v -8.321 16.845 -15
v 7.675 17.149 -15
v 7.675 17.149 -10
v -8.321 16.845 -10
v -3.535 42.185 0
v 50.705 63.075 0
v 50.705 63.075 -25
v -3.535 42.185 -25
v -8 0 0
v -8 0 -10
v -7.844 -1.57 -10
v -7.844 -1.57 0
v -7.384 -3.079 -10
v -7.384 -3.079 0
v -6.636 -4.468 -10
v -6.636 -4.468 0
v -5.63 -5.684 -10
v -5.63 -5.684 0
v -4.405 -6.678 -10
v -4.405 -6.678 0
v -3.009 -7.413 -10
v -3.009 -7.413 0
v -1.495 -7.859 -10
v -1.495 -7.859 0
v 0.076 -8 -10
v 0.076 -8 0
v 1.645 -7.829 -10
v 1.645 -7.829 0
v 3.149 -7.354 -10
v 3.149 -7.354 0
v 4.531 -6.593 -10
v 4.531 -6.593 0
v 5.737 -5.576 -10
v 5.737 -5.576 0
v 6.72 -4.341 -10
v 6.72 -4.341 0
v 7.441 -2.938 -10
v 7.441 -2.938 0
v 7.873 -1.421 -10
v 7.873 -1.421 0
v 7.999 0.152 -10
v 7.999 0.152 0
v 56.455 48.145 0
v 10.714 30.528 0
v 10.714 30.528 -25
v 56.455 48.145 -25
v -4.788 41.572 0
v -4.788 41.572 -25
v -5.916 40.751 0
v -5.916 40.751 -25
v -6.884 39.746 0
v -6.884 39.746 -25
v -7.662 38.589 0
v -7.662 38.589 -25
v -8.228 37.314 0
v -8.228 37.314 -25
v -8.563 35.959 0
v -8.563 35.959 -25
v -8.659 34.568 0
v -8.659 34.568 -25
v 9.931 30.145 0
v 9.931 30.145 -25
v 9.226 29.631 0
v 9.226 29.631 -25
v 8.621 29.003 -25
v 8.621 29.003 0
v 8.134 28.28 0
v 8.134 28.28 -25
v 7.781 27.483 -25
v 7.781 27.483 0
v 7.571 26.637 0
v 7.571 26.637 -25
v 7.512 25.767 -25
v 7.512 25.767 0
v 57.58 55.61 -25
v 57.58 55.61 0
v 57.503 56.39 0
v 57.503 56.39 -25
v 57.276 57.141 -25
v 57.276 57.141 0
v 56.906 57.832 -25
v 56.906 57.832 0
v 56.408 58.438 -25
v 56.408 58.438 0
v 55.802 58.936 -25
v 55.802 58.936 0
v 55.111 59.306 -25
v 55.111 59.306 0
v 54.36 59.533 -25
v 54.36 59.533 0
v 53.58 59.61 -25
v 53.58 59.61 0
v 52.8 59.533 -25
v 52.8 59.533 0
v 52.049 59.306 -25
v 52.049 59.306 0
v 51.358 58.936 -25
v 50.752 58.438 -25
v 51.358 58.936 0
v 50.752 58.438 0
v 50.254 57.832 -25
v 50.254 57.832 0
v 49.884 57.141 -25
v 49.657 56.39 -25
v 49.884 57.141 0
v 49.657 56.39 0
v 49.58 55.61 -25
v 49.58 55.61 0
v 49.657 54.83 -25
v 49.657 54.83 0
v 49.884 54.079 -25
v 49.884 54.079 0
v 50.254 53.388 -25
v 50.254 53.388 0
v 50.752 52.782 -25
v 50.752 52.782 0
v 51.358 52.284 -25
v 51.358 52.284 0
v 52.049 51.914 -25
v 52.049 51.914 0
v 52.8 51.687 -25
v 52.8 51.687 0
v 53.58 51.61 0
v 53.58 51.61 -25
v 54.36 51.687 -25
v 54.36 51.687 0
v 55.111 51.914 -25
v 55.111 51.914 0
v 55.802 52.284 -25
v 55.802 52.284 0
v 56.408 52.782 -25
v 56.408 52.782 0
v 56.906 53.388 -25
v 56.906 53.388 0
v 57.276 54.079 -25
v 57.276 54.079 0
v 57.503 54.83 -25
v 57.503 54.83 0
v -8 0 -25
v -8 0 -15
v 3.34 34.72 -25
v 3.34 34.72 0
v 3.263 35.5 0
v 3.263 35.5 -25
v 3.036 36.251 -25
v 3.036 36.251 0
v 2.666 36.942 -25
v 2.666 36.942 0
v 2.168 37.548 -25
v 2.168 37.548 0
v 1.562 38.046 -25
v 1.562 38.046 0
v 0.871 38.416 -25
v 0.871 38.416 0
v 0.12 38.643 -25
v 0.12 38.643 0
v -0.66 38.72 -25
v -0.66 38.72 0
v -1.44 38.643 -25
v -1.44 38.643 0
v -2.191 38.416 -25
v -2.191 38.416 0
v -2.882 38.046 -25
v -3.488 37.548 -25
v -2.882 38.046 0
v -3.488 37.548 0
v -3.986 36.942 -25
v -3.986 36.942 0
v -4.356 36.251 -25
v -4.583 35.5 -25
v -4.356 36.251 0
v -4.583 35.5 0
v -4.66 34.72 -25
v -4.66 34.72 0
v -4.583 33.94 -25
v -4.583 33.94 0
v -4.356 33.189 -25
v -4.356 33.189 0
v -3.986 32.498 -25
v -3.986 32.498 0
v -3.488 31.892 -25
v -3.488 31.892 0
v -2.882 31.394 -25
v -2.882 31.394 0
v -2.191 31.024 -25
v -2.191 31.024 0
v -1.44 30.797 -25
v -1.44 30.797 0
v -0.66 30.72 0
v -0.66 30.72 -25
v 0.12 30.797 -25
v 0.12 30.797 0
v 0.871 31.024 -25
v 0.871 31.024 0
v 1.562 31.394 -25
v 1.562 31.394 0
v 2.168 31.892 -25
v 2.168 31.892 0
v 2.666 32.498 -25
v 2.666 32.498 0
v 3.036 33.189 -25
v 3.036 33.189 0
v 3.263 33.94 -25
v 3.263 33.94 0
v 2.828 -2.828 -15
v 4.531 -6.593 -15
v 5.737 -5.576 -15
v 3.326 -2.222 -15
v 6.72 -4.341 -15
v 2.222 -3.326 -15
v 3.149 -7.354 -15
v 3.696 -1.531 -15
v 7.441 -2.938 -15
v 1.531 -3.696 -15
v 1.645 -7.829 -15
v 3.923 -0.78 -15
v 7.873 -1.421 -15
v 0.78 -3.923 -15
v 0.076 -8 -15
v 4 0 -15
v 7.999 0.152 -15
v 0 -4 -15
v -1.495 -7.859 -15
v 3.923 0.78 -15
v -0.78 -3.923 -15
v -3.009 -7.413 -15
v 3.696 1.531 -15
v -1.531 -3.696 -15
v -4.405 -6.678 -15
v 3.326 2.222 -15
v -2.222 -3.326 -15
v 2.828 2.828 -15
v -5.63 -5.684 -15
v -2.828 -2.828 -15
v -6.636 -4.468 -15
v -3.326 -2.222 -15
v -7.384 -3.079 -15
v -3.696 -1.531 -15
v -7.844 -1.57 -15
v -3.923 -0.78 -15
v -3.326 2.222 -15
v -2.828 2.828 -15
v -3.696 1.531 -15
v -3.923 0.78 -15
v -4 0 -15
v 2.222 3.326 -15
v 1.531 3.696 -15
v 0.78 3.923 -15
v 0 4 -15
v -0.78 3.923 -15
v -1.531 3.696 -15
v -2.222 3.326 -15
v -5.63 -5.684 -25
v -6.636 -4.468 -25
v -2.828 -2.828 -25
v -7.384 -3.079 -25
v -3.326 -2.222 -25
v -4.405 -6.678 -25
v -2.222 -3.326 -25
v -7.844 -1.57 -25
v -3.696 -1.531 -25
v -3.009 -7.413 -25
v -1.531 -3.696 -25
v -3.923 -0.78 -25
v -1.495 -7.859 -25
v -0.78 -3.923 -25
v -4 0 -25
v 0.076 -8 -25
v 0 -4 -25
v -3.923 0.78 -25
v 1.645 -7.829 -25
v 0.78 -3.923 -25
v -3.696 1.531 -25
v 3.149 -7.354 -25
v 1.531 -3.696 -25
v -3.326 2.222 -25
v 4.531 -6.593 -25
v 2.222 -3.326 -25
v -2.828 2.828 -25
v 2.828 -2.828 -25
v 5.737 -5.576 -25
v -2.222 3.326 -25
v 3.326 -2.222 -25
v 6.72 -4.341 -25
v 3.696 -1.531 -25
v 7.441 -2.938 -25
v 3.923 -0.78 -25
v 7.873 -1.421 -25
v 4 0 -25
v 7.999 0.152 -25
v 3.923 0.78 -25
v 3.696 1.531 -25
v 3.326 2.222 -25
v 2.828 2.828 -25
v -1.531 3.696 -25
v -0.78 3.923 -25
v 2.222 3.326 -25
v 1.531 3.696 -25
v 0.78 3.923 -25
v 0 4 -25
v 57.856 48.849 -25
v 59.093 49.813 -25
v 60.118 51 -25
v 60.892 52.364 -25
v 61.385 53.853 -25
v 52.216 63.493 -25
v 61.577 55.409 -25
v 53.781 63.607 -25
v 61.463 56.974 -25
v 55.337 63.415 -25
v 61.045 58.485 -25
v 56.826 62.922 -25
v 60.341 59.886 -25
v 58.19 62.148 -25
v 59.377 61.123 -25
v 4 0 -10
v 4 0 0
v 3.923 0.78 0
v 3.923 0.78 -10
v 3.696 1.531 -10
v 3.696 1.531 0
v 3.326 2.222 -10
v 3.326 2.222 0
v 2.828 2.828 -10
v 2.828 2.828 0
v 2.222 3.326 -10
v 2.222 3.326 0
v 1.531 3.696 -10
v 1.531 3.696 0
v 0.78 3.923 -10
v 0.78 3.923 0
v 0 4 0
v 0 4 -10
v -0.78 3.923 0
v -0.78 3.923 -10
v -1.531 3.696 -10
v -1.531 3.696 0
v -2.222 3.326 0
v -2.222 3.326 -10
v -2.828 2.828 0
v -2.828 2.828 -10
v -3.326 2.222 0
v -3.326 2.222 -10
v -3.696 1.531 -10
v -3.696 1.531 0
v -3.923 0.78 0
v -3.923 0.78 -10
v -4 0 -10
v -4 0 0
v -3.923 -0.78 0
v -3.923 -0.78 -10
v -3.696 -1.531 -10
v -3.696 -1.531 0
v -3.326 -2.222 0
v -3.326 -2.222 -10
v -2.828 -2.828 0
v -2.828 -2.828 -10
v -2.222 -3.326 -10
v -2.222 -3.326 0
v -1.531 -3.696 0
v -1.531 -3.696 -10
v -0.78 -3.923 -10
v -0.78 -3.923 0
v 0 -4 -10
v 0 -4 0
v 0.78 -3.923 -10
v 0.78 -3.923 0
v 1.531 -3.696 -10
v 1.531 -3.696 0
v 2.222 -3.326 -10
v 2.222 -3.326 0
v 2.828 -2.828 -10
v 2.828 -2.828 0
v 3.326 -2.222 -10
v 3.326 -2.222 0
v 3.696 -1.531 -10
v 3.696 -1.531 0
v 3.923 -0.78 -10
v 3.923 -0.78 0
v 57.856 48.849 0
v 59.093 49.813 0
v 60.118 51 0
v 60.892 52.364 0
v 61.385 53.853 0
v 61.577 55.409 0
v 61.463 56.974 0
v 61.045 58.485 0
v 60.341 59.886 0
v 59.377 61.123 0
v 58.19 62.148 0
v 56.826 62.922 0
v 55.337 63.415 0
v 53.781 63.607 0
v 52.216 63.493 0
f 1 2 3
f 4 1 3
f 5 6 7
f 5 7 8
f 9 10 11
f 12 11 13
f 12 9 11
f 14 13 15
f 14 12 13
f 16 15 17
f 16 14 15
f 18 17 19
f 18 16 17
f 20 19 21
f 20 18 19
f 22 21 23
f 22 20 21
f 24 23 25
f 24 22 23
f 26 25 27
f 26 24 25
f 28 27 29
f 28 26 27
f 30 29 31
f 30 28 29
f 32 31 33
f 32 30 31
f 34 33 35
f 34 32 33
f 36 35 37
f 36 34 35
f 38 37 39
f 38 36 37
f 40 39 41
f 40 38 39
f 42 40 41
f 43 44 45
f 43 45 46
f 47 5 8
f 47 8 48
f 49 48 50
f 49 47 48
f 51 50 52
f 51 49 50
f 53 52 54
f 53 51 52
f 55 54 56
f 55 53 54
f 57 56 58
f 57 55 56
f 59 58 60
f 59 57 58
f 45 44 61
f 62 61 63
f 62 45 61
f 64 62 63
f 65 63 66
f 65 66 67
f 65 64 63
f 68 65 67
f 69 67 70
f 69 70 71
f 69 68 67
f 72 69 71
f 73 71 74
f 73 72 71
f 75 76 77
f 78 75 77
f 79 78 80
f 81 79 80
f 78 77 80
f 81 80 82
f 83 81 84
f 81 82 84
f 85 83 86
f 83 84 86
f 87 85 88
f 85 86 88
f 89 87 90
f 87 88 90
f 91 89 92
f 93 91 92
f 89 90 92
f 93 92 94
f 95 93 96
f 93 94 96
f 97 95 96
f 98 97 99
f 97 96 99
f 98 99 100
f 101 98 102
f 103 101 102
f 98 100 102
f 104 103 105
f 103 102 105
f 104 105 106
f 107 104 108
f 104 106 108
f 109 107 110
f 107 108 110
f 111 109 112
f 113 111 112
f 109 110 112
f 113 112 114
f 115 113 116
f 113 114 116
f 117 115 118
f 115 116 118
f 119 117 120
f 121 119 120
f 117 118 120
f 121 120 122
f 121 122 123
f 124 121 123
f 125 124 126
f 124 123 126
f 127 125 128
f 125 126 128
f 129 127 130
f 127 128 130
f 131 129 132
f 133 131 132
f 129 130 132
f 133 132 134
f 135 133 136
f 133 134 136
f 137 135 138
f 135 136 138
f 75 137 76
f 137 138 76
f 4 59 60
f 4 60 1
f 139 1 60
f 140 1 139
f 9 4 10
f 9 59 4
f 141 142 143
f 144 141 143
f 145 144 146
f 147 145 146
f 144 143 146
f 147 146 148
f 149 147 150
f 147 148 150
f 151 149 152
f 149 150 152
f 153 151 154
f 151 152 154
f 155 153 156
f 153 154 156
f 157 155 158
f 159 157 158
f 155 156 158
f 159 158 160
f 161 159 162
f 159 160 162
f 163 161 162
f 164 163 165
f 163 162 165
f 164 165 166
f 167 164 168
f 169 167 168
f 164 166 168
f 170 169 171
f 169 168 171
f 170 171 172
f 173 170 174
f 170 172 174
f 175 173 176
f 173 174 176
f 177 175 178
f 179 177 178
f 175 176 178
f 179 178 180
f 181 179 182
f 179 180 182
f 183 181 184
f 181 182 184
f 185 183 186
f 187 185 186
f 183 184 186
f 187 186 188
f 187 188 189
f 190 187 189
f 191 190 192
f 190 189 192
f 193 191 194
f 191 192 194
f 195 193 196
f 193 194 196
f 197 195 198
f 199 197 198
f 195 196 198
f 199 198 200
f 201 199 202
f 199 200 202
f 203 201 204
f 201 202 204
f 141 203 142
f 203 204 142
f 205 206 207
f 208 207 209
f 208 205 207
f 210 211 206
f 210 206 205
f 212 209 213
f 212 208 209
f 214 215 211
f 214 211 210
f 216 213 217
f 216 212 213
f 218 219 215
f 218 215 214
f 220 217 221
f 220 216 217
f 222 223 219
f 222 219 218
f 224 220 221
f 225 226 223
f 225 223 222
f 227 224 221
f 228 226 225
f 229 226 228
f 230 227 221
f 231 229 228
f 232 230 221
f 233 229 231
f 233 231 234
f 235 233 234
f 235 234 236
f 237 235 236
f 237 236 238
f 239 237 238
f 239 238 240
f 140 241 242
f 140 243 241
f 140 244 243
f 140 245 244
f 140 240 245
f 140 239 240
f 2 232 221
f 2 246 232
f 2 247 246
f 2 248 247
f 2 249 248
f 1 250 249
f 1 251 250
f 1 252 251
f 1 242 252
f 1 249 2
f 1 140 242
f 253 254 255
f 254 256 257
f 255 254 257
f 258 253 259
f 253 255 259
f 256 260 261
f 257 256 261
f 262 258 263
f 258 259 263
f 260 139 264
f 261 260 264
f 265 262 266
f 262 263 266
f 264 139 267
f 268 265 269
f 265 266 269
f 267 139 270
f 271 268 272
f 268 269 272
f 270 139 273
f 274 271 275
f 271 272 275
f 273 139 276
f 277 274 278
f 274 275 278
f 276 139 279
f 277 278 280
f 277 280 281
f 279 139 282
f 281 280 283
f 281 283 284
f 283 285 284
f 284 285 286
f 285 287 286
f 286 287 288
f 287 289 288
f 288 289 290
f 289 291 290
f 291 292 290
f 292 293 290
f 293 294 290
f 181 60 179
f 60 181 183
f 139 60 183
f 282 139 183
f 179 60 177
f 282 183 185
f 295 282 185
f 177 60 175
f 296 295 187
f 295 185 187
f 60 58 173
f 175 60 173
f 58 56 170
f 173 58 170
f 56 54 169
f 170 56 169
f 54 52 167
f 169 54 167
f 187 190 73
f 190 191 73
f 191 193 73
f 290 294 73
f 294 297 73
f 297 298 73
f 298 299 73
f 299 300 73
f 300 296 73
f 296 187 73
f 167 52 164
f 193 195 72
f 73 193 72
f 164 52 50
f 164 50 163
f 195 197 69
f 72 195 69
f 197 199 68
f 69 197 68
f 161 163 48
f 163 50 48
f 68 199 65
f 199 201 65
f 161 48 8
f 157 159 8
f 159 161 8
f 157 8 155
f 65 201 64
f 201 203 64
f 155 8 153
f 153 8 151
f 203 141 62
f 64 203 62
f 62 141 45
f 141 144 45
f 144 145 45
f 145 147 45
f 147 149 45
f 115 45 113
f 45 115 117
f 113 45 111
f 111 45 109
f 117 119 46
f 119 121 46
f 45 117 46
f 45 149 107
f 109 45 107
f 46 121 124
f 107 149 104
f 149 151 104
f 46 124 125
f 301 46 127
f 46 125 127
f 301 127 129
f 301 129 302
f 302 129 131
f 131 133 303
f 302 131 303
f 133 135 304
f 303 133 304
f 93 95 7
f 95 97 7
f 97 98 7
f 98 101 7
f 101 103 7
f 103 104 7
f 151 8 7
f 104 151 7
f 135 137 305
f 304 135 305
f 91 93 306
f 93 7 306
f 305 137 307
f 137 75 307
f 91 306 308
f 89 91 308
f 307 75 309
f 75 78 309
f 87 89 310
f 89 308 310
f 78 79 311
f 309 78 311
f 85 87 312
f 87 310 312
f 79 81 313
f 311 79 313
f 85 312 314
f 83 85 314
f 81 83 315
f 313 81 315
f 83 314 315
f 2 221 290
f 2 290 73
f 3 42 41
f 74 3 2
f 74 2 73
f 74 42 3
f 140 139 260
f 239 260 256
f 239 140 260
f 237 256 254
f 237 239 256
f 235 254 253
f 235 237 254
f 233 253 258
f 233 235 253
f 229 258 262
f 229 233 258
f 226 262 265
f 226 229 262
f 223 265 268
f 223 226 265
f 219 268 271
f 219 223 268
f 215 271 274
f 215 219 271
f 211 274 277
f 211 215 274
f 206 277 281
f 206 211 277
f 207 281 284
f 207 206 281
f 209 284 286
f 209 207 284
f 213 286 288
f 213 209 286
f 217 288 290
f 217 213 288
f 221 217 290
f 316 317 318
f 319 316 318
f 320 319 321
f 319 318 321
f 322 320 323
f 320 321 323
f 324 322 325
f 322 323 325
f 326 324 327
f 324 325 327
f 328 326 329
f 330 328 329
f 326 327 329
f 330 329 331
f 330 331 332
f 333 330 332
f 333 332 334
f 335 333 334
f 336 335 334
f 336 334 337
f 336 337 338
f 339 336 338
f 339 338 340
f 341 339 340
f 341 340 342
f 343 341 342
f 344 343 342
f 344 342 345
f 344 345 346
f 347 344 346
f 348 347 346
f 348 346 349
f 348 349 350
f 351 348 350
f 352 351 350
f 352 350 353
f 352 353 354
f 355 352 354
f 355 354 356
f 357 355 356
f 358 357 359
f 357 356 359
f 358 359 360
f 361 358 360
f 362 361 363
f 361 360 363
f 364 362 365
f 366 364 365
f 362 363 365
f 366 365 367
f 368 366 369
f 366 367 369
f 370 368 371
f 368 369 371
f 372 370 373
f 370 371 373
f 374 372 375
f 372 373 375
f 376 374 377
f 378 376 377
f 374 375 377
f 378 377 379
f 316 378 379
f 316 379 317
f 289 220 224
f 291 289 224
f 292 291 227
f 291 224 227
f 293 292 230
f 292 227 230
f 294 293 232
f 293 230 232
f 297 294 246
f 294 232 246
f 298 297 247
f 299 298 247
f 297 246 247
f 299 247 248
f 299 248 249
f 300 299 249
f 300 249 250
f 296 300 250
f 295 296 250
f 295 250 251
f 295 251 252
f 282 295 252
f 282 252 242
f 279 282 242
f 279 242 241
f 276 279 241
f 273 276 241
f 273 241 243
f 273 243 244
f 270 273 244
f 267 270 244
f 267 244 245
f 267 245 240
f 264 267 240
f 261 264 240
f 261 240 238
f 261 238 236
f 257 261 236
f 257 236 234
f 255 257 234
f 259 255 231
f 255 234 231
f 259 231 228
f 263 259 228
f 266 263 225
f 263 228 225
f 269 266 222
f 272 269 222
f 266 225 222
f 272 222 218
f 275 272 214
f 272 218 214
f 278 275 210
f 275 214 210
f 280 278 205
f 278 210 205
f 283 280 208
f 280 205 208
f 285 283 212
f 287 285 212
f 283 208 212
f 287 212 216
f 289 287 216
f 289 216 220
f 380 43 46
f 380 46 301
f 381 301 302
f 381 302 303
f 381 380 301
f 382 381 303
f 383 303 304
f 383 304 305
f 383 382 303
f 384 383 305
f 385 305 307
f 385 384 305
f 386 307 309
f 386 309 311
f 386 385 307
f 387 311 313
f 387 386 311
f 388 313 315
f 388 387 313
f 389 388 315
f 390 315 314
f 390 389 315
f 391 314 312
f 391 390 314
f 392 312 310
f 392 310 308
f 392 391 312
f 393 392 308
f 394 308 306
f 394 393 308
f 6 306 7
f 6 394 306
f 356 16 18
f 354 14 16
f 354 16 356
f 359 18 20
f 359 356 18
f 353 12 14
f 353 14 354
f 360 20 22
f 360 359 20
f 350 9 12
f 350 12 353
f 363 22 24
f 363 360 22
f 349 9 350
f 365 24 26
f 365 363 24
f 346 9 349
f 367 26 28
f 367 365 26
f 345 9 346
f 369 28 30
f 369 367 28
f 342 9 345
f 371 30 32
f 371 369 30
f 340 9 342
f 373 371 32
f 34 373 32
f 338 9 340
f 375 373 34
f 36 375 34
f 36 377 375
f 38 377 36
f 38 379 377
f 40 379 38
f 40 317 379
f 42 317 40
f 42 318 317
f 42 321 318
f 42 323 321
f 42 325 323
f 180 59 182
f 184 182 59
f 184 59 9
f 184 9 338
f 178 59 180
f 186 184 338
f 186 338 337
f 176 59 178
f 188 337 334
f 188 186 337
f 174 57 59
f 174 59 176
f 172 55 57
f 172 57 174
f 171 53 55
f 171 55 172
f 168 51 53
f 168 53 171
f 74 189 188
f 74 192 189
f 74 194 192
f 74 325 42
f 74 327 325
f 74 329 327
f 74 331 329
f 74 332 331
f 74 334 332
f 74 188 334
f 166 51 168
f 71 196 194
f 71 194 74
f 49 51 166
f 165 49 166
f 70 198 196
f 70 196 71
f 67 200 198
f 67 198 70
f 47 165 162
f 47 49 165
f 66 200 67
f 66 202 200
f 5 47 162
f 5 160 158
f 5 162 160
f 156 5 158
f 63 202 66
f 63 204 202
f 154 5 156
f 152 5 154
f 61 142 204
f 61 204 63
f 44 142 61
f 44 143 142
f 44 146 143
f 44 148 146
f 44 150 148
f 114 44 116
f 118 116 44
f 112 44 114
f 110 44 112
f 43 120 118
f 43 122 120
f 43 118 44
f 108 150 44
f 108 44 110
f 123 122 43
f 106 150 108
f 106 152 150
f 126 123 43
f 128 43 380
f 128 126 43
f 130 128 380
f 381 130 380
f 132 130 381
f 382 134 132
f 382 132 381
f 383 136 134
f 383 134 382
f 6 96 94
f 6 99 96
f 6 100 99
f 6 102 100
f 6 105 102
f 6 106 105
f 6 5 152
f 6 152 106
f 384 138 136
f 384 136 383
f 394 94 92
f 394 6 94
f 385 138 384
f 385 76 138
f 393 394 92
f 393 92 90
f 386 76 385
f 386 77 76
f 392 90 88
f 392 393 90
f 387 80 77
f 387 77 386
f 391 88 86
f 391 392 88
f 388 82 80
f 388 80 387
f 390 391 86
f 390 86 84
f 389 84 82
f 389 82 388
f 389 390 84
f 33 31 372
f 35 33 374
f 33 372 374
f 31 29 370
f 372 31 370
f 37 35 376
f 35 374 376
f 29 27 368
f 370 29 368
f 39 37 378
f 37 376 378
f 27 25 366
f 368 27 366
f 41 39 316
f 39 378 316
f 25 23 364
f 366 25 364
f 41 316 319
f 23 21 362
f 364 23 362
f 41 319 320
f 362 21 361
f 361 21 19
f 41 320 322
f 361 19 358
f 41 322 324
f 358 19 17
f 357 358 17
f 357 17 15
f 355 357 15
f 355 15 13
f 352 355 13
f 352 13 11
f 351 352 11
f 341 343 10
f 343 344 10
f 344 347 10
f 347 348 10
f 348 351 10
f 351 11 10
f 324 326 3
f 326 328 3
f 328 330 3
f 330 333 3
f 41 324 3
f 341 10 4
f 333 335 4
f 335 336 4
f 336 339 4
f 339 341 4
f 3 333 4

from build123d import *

# Parameters (mm, degrees)
SKETCH1_R               = 4
BOSS_EXTRUDE1_DEPTH     = 25
FILLET1_R               = 5
SKETCH2_W               = 5
SKETCH2_H               = 30
CUT_EXTRUDE1_DEPTH      = 1.812260823
CUT_EXTRUDE1_DEPTH_BACK = 71.77899263


with BuildPart() as part:
    # Sketch1 → Boss-Extrude1 (new body)
    with BuildSketch(Plane.XY):
        with BuildLine():
            ThreePointArc((56.45524489, 48.144548452), (61.045451548, 58.48524489), (50.70475511, 63.075451548))
            Line((50.70475511, 63.075451548), (-3.53524489, 42.185451548))
            ThreePointArc((-3.53524489, 42.185451548), (-7.298349786, 39.184561806), (-8.658548629, 34.567619439))
            Line((-8.658548629, 34.567619439), (-8, 0))
            ThreePointArc((-8, 0), (0.076026565, -7.999638739), (7.99855499, 0.152046264))
            Line((7.99855499, 0.152046264), (7.445069005, 29.268763528))
            Line((7.445069005, 29.268763528), (56.45524489, 48.144548452))
        make_face()
        Circle(SKETCH1_R, mode=Mode.SUBTRACT)
        with Locations((-0.66, 34.72)):
            Circle(SKETCH1_R, mode=Mode.SUBTRACT)
        with Locations((53.58, 55.61)):
            Circle(SKETCH1_R, mode=Mode.SUBTRACT)
    extrude(amount=-BOSS_EXTRUDE1_DEPTH)

    # Fillet1
    fillet1_edges = [part.edges().sort_by_distance(p)[0] for p in [
        (7.445069005, 29.268763528, -12.5),
    ]]
    fillet(fillet1_edges, radius=FILLET1_R)

    # Sketch2 → Cut-Extrude1 (cut, two sides)
    with BuildSketch(Plane(origin=(-7.997097521, -0.152352916, 0), x_dir=(0, 0, 1), z_dir=(-0.999818579, -0.01904757, 0))) as cut_extrude1_sk:
        with Locations((-12.5, 2)):
            Rectangle(SKETCH2_W, SKETCH2_H)
    extrude(amount=CUT_EXTRUDE1_DEPTH, mode=Mode.SUBTRACT)
    extrude(cut_extrude1_sk.sketch, amount=-CUT_EXTRUDE1_DEPTH_BACK, mode=Mode.SUBTRACT)


solid = part.part
